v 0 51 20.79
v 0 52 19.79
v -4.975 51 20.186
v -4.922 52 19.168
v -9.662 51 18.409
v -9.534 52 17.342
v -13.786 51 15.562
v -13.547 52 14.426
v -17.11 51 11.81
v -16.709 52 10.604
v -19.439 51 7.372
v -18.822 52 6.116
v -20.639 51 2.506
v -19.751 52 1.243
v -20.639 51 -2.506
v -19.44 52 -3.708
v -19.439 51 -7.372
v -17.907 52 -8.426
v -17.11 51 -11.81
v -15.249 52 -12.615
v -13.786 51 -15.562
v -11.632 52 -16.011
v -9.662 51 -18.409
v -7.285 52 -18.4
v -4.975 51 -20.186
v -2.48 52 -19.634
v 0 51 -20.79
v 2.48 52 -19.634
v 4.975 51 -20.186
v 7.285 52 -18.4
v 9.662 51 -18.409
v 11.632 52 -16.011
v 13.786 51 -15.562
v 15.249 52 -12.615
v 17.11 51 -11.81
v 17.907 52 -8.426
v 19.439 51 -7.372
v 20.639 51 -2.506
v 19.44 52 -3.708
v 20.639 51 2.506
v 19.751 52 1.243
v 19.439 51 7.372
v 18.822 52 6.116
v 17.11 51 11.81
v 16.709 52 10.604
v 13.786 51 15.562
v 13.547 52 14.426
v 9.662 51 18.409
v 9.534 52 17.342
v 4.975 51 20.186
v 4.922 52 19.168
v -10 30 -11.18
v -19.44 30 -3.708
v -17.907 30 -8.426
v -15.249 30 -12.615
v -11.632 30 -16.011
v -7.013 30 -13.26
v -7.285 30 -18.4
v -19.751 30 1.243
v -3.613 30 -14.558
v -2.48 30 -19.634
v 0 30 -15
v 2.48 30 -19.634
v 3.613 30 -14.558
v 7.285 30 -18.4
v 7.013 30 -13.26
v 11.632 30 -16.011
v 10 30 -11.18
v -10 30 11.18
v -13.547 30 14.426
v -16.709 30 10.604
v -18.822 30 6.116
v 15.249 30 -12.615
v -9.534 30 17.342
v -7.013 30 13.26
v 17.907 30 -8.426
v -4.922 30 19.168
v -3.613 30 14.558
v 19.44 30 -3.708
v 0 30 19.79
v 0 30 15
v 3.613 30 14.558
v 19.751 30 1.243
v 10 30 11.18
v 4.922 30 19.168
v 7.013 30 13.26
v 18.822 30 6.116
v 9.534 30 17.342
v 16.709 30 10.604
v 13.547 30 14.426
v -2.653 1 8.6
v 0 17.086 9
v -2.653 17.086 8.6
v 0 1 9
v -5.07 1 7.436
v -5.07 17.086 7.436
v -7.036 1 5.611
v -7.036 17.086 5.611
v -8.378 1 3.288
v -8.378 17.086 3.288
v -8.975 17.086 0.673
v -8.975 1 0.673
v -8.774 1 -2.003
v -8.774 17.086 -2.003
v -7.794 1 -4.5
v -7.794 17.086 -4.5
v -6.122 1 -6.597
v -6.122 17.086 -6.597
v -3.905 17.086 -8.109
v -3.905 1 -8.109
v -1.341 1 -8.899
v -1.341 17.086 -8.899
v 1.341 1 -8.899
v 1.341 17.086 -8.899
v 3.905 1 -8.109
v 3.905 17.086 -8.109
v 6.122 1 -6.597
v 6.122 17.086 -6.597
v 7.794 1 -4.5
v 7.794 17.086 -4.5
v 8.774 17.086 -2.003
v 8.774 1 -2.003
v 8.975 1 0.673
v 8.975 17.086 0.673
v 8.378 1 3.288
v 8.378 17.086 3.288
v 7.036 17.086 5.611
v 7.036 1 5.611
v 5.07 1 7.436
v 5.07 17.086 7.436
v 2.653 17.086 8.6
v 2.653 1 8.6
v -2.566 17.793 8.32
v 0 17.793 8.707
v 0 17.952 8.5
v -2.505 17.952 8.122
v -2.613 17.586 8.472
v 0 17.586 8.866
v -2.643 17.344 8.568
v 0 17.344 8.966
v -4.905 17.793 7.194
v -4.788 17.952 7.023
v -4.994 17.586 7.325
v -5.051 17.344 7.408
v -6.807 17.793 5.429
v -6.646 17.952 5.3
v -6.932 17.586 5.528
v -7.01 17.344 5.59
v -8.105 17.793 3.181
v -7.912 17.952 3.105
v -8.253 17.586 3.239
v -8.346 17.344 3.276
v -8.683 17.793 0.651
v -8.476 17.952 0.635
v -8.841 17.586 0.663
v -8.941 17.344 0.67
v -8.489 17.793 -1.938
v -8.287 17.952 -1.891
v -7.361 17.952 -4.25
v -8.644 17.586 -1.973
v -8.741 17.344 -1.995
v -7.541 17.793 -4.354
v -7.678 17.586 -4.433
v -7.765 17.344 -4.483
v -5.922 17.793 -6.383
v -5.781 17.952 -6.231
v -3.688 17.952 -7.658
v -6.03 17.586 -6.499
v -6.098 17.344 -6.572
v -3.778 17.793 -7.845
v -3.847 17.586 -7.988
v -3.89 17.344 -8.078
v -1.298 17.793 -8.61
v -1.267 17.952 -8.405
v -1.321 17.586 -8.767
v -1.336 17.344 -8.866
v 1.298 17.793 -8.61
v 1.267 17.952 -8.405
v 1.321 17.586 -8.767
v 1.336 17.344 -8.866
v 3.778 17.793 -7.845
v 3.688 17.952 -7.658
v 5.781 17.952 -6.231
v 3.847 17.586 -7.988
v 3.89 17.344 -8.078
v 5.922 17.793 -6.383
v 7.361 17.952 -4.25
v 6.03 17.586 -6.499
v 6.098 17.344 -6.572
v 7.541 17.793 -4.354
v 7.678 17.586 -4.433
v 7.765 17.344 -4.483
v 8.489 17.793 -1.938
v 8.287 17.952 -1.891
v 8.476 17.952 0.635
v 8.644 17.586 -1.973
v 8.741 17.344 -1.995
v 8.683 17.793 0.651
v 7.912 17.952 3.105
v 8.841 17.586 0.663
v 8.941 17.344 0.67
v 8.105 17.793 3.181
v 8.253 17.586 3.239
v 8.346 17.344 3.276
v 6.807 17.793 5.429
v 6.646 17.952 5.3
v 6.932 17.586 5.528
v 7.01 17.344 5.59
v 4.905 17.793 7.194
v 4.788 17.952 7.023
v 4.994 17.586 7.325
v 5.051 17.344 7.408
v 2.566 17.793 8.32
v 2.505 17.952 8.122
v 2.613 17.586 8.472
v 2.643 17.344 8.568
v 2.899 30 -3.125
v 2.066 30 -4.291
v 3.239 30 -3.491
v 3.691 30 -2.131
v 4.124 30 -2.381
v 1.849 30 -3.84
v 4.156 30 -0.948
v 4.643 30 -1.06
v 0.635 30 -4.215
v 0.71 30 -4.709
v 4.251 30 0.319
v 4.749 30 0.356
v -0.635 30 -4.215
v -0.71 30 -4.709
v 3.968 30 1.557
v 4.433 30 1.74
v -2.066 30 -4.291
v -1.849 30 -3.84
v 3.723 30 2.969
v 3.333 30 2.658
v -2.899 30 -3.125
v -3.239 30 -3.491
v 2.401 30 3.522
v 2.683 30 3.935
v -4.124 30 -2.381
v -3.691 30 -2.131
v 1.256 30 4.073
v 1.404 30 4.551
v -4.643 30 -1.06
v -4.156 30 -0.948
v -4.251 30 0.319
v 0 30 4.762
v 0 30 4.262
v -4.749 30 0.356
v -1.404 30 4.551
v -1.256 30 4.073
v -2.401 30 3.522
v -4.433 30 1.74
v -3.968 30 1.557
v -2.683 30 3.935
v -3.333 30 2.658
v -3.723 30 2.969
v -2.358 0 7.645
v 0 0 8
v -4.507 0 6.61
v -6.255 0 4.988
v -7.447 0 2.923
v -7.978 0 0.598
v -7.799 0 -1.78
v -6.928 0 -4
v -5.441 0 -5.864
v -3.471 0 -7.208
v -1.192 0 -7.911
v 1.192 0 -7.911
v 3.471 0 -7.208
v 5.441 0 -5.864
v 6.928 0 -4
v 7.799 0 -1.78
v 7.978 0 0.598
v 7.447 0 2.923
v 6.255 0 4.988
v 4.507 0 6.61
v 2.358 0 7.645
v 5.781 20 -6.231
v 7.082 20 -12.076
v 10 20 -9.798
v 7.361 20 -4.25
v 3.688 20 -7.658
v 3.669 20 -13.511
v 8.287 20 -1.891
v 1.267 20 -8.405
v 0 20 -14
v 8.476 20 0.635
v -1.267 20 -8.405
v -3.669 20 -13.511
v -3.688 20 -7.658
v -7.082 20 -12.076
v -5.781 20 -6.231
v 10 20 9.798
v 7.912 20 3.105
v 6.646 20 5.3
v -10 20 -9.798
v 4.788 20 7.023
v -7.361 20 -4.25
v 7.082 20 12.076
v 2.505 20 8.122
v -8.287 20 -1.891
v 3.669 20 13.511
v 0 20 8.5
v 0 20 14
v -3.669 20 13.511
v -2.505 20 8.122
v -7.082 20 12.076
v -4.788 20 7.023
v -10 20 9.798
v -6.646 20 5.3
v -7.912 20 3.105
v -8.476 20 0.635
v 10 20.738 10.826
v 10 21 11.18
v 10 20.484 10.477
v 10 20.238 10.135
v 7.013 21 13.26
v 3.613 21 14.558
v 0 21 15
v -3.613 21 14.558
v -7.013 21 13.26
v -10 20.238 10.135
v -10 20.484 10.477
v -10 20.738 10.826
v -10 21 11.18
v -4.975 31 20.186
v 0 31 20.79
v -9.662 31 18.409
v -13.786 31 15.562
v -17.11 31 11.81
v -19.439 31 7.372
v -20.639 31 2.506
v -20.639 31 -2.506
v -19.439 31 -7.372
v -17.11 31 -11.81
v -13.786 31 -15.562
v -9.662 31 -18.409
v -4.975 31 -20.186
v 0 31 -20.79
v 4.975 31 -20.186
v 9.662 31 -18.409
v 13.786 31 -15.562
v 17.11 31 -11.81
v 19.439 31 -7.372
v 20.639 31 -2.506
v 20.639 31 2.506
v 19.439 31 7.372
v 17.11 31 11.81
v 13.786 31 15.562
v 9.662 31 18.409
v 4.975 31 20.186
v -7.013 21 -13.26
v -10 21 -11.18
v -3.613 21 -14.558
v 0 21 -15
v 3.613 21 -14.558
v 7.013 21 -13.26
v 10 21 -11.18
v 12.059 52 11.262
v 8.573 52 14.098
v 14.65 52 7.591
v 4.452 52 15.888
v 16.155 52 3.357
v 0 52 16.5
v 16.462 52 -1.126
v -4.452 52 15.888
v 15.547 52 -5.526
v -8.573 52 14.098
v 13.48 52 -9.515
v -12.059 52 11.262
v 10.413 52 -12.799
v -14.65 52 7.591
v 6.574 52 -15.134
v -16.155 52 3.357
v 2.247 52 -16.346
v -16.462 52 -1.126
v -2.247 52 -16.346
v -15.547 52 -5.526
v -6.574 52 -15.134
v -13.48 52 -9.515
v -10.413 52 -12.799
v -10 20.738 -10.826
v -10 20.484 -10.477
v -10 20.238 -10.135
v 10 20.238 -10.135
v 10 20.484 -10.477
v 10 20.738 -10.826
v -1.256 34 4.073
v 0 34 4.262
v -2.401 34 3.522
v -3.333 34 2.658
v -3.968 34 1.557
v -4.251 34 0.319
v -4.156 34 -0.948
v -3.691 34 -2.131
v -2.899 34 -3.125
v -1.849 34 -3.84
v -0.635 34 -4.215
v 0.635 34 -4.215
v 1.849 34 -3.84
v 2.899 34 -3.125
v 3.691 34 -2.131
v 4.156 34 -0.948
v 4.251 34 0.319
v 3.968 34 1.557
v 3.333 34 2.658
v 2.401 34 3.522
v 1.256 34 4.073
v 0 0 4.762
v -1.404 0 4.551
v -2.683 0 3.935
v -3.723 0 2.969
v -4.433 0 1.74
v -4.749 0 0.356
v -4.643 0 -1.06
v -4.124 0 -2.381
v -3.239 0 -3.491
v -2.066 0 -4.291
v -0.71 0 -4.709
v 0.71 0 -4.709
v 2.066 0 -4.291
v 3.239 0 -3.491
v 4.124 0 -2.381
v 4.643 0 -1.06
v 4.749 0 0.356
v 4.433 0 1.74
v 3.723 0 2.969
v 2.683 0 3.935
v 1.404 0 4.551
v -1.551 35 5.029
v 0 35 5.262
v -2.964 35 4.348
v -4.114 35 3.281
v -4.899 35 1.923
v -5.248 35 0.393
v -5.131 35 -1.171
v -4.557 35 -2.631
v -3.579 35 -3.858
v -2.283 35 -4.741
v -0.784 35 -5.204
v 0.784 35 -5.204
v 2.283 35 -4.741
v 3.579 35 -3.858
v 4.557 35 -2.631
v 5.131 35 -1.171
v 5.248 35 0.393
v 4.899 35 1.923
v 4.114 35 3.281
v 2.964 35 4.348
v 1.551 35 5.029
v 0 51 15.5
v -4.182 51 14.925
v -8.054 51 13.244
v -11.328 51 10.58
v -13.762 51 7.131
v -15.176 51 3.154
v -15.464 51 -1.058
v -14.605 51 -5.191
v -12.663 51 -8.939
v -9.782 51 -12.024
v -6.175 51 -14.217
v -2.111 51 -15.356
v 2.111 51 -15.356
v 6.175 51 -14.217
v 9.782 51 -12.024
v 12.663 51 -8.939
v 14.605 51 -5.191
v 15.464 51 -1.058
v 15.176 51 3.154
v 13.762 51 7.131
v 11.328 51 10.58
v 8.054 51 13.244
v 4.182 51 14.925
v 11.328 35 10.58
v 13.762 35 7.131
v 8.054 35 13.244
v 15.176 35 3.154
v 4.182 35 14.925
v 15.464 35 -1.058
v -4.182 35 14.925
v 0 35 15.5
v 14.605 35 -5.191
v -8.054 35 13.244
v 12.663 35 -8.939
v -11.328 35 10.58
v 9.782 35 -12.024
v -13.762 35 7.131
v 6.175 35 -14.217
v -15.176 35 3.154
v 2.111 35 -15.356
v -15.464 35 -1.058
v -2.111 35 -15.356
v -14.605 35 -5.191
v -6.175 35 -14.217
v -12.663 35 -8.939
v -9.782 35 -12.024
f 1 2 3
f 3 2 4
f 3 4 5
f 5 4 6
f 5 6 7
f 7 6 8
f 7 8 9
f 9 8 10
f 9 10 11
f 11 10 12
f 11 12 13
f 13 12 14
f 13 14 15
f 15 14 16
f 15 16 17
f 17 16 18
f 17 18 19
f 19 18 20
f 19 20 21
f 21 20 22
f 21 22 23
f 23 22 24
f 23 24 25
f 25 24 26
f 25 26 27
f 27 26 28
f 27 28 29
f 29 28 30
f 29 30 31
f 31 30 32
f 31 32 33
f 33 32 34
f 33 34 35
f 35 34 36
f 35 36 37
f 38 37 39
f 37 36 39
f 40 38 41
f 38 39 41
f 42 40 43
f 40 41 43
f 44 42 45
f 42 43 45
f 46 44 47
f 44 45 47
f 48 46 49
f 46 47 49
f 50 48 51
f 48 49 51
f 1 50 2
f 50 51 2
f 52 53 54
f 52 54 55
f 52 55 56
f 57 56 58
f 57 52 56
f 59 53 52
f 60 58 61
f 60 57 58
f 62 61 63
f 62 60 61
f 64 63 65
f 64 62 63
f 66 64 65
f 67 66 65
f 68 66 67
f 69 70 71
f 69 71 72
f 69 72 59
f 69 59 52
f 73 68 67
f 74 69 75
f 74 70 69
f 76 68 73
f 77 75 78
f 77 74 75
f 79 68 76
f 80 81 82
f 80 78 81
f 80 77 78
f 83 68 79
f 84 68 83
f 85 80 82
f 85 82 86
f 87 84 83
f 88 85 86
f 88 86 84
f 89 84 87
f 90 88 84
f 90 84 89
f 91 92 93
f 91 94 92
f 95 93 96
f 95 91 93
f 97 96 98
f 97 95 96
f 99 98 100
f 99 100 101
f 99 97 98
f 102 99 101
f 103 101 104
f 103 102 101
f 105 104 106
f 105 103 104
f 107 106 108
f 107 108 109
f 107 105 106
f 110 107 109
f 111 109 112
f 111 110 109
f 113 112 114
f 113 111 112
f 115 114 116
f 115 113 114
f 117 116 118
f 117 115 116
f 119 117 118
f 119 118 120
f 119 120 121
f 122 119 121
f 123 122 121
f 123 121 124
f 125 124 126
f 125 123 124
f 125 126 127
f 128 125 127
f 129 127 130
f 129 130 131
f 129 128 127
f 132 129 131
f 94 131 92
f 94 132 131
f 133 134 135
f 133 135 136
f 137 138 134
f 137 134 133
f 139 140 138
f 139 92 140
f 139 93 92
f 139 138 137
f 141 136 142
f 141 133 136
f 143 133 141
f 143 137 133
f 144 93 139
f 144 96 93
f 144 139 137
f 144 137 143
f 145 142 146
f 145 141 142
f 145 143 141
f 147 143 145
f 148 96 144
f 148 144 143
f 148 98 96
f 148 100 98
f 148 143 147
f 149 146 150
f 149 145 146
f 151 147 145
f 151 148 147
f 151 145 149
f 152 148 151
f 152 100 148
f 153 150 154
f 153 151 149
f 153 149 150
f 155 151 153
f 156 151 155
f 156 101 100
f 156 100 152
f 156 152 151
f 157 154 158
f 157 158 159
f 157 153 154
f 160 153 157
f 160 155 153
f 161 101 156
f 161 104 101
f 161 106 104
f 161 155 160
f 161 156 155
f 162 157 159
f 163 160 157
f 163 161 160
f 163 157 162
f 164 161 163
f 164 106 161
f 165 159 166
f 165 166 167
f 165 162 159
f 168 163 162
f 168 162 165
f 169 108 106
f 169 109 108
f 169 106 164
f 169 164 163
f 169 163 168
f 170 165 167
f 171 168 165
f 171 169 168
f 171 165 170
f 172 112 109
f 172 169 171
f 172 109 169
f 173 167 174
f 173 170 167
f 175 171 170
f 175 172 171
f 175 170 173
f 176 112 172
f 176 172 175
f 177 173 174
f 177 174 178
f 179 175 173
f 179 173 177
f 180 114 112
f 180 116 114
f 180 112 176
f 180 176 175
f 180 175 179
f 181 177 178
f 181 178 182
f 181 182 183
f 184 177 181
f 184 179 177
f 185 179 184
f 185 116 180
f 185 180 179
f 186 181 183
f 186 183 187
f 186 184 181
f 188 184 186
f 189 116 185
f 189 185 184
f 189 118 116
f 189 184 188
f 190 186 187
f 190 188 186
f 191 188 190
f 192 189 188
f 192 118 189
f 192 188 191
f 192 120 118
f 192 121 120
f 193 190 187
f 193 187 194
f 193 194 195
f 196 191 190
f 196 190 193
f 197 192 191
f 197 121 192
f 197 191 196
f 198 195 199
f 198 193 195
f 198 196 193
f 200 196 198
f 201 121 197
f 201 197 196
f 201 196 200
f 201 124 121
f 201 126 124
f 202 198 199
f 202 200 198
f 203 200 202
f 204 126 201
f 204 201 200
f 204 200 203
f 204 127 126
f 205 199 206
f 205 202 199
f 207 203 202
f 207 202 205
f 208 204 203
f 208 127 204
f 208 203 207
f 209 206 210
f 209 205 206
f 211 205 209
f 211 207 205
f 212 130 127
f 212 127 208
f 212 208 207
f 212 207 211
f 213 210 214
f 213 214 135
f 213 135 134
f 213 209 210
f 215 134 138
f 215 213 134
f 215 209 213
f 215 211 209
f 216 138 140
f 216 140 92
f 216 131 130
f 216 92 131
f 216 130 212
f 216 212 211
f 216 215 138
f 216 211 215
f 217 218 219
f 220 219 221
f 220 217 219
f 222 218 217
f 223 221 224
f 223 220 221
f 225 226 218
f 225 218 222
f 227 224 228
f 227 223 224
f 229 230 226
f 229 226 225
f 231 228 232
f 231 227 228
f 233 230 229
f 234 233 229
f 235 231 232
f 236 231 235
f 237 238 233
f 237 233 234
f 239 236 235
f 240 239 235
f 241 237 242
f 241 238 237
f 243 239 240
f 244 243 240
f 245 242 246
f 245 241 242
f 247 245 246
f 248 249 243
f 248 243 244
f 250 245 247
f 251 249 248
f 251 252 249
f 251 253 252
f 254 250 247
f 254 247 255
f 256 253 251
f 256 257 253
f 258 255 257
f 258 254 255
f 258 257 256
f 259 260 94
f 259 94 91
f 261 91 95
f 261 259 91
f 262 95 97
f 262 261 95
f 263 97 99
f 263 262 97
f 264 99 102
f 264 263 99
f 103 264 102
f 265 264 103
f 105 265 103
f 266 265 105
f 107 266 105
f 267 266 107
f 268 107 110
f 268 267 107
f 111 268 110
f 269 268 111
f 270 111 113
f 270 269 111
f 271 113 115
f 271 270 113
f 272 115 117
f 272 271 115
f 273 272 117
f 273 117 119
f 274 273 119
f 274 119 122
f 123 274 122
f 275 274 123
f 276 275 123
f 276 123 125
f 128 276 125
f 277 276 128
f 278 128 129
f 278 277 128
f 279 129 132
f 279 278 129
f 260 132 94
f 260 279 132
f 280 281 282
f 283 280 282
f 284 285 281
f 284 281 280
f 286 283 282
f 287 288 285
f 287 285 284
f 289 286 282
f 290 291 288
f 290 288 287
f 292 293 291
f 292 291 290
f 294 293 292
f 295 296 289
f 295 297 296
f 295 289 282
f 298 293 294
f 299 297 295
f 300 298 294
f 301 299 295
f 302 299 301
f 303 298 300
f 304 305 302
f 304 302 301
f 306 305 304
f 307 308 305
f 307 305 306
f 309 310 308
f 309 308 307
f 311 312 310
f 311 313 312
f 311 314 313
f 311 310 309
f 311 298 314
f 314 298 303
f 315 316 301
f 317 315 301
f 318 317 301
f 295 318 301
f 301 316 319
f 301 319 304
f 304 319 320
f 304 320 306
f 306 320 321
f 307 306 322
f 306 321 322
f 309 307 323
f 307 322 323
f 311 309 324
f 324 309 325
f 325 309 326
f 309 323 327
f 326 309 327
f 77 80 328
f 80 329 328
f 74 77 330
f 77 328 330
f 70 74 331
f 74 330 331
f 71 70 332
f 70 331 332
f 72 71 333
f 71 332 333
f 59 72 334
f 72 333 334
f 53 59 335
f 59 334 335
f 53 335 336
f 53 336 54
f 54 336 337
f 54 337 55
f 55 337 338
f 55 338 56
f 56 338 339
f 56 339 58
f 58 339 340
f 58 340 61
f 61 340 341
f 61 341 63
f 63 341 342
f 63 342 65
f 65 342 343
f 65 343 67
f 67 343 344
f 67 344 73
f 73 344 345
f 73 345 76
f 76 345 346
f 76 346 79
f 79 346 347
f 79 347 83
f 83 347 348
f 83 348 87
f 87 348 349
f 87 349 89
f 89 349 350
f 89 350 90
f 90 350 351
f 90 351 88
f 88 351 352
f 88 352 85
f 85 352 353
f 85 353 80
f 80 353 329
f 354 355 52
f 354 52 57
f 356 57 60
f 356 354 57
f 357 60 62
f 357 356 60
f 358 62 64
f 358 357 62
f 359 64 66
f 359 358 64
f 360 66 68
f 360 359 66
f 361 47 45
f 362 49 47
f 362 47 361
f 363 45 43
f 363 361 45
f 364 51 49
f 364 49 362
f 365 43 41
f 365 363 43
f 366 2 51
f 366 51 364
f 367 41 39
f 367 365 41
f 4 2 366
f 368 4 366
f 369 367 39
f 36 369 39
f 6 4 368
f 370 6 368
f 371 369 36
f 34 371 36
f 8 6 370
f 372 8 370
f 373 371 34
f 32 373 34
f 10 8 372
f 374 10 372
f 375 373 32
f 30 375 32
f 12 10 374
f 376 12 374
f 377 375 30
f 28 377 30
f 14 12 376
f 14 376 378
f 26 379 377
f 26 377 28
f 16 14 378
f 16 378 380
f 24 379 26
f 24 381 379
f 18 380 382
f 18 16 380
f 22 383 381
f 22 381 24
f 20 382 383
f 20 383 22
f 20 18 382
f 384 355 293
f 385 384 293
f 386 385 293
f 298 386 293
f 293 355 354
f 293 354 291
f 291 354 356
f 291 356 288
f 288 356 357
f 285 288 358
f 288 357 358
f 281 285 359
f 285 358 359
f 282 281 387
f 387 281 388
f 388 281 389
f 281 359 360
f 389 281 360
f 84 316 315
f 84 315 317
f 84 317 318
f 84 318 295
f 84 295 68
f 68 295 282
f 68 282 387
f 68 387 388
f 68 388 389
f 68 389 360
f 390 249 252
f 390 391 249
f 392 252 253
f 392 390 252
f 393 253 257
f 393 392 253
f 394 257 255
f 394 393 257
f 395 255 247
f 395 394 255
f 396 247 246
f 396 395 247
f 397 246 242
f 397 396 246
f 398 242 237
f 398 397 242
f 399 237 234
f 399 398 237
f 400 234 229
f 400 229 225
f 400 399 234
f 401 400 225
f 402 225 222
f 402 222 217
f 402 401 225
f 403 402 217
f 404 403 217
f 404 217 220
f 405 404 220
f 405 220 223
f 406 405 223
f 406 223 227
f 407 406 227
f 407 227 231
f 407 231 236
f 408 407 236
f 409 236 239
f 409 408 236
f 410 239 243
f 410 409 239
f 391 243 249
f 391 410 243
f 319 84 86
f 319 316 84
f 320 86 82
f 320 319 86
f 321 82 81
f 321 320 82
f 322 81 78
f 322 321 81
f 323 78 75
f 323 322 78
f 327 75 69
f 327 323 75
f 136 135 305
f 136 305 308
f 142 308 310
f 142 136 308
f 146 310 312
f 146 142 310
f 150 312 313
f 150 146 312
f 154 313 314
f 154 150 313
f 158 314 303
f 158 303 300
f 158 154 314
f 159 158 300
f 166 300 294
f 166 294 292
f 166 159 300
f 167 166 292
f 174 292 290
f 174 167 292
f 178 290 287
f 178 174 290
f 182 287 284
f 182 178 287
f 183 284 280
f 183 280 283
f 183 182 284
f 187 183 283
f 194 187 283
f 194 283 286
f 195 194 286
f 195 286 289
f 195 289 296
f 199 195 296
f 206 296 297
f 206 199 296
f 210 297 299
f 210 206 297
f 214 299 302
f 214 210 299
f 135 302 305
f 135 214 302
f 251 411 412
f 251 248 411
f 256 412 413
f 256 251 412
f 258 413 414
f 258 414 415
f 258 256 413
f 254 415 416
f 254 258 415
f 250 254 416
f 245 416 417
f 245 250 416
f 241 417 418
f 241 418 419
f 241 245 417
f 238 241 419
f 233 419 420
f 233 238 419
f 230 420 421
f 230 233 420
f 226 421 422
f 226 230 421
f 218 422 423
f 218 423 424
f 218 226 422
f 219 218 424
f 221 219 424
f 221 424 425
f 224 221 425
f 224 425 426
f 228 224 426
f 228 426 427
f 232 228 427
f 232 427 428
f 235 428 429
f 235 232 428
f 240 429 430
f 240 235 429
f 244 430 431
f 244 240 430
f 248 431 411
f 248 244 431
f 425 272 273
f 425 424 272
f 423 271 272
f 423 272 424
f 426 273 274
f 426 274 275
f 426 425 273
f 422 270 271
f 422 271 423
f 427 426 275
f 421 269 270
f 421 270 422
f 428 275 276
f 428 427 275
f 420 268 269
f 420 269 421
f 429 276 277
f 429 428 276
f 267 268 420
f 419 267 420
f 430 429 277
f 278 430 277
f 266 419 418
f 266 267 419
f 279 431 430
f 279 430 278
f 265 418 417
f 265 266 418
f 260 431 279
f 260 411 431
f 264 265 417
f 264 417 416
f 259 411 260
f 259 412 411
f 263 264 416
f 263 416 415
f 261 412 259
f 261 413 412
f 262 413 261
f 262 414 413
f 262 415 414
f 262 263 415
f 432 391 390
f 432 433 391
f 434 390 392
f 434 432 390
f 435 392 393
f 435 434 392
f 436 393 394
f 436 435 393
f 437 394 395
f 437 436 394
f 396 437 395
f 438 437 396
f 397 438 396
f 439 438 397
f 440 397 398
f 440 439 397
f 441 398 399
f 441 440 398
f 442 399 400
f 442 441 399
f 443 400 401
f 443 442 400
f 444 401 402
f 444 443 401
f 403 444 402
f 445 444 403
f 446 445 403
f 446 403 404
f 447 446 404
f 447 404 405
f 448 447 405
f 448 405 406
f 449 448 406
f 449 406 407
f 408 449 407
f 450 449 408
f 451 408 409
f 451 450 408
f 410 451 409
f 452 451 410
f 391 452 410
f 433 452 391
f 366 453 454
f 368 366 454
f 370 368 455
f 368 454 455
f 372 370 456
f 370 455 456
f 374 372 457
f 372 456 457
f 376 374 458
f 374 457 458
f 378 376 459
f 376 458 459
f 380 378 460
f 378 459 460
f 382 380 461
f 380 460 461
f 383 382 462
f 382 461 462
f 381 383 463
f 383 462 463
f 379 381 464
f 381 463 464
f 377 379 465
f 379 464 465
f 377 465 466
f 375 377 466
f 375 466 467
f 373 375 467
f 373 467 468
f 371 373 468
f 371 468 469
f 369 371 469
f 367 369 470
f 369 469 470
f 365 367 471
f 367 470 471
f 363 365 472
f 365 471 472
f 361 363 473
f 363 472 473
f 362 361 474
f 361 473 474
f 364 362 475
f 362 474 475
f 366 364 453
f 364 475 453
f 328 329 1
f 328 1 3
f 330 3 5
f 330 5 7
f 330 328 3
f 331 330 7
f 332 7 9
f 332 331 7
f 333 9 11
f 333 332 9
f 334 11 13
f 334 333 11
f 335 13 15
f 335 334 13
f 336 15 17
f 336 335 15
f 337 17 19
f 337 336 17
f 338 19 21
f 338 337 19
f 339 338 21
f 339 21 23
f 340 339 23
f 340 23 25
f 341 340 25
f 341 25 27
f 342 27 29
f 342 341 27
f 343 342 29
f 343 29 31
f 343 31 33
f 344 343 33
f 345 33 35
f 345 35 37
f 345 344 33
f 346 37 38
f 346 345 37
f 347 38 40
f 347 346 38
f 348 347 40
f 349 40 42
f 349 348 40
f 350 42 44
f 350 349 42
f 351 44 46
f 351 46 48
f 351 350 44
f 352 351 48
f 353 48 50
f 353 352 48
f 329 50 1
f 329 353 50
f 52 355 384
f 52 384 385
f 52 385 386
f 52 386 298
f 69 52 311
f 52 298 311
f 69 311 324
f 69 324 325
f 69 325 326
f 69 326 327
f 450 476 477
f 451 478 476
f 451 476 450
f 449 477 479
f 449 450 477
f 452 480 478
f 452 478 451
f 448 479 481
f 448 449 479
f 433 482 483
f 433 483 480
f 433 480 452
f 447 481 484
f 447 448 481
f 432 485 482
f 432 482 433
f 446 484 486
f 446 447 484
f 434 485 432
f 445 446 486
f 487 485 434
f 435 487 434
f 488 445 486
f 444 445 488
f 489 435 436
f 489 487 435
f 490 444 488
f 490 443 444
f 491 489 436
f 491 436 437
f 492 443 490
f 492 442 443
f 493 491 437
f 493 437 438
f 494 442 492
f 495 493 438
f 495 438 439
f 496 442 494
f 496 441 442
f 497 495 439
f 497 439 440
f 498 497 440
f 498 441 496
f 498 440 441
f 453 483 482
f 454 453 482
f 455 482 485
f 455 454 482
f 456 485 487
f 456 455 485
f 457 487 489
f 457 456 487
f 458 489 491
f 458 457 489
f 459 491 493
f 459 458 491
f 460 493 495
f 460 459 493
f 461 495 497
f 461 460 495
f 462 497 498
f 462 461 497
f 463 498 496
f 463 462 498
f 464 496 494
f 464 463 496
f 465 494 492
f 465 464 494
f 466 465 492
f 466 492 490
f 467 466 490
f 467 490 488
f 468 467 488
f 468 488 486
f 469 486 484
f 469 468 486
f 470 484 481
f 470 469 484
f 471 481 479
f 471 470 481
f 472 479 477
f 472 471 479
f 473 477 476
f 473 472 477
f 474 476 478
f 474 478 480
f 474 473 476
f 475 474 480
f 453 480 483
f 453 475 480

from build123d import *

# Parameters (mm, degrees)
CHAFL_N1_SIZE         = 1
REDONDEO1_R           = 1
CHAFL_N2_SIZE         = 1
CROQUIS3_W            = 14.730869345
CROQUIS3_H            = 22.360679774
CORTAR_EXTRUIR1_DEPTH = 30


with BuildPart() as part:
    # Croquis1 → Revolución1 (revolve)
    with BuildSketch(Plane.XY, mode=Mode.PRIVATE) as revoluci_n1_sk:
        Polygon((15.5, 52), (20.790206312, 52), (20.790206312, 30), (15, 30), (15, 20), (8.5, 20), (8.5, 17.951688966), (9, 17.951688966), (9, 0), (4.7625, 0), (4.7625, 30), (4.2625, 30), (4.2625, 34), (5.2625, 35), (15.5, 35), align=None)
    revolve(revoluci_n1_sk.sketch.rotate(Axis((0, 50.374990084, 0), (0, -1, 0)), 90), axis=Axis((0, 50.374990084, 0), (0, -1, 0)))

    # Chaflán1
    chafl_n1_edges = [part.edges().sort_by_distance(p)[0] for p in [
        (0, 0, -9),
    ]]
    chamfer(chafl_n1_edges, length=CHAFL_N1_SIZE)

    # Redondeo1
    # the kernel refuses this fillet: 1 mm, written as the material it takes off along each edge
    with BuildSketch(Plane(origin=(0, 17.951688966, 0), x_dir=(0, 0, 1), z_dir=(1, 0, 0))) as redondeo1_piece_1:
        with BuildLine():
            CenterArc((8, 0.866025404), REDONDEO1_R, 300, 60)
            Line((8.5, 0), (8.51, -0.017320508))
            ThreePointArc((8.51, -0.017320508), (8.75, -0.02), (9, -0.02))
            Line((9, -0.02), (9.02, 0))
            Line((9.02, 0), (9.02, 0.866025404))
            Line((9.02, 0.866025404), (9, 0.866025404))
        make_face()
    revolve(axis=Axis((0, 17.951688966, 0), (0, -1, 0)), mode=Mode.SUBTRACT)

    # Chaflán2
    chafl_n2_edges = [part.edges().sort_by_distance(p)[0] for p in [
        (0, 20, -15),
        (0, 30, -20.790206312),
        (0, 52, -20.790206312),
        (0, 52, -15.5),
    ]]
    chamfer(chafl_n2_edges, length=CHAFL_N2_SIZE)

    # Croquis3 → Cortar-Extruir1 (cut)
    with BuildSketch(Plane.XZ):
        Polygon((10, 11.180339887), (10, -11.180339887), (24.245950338, -11.180339887), (24.827853146, 11.180339887), align=None)
        with Locations((-17.365434673, 0)):
            Rectangle(CROQUIS3_W, CROQUIS3_H)
    extrude(amount=-CORTAR_EXTRUIR1_DEPTH, mode=Mode.SUBTRACT)


solid = part.part
